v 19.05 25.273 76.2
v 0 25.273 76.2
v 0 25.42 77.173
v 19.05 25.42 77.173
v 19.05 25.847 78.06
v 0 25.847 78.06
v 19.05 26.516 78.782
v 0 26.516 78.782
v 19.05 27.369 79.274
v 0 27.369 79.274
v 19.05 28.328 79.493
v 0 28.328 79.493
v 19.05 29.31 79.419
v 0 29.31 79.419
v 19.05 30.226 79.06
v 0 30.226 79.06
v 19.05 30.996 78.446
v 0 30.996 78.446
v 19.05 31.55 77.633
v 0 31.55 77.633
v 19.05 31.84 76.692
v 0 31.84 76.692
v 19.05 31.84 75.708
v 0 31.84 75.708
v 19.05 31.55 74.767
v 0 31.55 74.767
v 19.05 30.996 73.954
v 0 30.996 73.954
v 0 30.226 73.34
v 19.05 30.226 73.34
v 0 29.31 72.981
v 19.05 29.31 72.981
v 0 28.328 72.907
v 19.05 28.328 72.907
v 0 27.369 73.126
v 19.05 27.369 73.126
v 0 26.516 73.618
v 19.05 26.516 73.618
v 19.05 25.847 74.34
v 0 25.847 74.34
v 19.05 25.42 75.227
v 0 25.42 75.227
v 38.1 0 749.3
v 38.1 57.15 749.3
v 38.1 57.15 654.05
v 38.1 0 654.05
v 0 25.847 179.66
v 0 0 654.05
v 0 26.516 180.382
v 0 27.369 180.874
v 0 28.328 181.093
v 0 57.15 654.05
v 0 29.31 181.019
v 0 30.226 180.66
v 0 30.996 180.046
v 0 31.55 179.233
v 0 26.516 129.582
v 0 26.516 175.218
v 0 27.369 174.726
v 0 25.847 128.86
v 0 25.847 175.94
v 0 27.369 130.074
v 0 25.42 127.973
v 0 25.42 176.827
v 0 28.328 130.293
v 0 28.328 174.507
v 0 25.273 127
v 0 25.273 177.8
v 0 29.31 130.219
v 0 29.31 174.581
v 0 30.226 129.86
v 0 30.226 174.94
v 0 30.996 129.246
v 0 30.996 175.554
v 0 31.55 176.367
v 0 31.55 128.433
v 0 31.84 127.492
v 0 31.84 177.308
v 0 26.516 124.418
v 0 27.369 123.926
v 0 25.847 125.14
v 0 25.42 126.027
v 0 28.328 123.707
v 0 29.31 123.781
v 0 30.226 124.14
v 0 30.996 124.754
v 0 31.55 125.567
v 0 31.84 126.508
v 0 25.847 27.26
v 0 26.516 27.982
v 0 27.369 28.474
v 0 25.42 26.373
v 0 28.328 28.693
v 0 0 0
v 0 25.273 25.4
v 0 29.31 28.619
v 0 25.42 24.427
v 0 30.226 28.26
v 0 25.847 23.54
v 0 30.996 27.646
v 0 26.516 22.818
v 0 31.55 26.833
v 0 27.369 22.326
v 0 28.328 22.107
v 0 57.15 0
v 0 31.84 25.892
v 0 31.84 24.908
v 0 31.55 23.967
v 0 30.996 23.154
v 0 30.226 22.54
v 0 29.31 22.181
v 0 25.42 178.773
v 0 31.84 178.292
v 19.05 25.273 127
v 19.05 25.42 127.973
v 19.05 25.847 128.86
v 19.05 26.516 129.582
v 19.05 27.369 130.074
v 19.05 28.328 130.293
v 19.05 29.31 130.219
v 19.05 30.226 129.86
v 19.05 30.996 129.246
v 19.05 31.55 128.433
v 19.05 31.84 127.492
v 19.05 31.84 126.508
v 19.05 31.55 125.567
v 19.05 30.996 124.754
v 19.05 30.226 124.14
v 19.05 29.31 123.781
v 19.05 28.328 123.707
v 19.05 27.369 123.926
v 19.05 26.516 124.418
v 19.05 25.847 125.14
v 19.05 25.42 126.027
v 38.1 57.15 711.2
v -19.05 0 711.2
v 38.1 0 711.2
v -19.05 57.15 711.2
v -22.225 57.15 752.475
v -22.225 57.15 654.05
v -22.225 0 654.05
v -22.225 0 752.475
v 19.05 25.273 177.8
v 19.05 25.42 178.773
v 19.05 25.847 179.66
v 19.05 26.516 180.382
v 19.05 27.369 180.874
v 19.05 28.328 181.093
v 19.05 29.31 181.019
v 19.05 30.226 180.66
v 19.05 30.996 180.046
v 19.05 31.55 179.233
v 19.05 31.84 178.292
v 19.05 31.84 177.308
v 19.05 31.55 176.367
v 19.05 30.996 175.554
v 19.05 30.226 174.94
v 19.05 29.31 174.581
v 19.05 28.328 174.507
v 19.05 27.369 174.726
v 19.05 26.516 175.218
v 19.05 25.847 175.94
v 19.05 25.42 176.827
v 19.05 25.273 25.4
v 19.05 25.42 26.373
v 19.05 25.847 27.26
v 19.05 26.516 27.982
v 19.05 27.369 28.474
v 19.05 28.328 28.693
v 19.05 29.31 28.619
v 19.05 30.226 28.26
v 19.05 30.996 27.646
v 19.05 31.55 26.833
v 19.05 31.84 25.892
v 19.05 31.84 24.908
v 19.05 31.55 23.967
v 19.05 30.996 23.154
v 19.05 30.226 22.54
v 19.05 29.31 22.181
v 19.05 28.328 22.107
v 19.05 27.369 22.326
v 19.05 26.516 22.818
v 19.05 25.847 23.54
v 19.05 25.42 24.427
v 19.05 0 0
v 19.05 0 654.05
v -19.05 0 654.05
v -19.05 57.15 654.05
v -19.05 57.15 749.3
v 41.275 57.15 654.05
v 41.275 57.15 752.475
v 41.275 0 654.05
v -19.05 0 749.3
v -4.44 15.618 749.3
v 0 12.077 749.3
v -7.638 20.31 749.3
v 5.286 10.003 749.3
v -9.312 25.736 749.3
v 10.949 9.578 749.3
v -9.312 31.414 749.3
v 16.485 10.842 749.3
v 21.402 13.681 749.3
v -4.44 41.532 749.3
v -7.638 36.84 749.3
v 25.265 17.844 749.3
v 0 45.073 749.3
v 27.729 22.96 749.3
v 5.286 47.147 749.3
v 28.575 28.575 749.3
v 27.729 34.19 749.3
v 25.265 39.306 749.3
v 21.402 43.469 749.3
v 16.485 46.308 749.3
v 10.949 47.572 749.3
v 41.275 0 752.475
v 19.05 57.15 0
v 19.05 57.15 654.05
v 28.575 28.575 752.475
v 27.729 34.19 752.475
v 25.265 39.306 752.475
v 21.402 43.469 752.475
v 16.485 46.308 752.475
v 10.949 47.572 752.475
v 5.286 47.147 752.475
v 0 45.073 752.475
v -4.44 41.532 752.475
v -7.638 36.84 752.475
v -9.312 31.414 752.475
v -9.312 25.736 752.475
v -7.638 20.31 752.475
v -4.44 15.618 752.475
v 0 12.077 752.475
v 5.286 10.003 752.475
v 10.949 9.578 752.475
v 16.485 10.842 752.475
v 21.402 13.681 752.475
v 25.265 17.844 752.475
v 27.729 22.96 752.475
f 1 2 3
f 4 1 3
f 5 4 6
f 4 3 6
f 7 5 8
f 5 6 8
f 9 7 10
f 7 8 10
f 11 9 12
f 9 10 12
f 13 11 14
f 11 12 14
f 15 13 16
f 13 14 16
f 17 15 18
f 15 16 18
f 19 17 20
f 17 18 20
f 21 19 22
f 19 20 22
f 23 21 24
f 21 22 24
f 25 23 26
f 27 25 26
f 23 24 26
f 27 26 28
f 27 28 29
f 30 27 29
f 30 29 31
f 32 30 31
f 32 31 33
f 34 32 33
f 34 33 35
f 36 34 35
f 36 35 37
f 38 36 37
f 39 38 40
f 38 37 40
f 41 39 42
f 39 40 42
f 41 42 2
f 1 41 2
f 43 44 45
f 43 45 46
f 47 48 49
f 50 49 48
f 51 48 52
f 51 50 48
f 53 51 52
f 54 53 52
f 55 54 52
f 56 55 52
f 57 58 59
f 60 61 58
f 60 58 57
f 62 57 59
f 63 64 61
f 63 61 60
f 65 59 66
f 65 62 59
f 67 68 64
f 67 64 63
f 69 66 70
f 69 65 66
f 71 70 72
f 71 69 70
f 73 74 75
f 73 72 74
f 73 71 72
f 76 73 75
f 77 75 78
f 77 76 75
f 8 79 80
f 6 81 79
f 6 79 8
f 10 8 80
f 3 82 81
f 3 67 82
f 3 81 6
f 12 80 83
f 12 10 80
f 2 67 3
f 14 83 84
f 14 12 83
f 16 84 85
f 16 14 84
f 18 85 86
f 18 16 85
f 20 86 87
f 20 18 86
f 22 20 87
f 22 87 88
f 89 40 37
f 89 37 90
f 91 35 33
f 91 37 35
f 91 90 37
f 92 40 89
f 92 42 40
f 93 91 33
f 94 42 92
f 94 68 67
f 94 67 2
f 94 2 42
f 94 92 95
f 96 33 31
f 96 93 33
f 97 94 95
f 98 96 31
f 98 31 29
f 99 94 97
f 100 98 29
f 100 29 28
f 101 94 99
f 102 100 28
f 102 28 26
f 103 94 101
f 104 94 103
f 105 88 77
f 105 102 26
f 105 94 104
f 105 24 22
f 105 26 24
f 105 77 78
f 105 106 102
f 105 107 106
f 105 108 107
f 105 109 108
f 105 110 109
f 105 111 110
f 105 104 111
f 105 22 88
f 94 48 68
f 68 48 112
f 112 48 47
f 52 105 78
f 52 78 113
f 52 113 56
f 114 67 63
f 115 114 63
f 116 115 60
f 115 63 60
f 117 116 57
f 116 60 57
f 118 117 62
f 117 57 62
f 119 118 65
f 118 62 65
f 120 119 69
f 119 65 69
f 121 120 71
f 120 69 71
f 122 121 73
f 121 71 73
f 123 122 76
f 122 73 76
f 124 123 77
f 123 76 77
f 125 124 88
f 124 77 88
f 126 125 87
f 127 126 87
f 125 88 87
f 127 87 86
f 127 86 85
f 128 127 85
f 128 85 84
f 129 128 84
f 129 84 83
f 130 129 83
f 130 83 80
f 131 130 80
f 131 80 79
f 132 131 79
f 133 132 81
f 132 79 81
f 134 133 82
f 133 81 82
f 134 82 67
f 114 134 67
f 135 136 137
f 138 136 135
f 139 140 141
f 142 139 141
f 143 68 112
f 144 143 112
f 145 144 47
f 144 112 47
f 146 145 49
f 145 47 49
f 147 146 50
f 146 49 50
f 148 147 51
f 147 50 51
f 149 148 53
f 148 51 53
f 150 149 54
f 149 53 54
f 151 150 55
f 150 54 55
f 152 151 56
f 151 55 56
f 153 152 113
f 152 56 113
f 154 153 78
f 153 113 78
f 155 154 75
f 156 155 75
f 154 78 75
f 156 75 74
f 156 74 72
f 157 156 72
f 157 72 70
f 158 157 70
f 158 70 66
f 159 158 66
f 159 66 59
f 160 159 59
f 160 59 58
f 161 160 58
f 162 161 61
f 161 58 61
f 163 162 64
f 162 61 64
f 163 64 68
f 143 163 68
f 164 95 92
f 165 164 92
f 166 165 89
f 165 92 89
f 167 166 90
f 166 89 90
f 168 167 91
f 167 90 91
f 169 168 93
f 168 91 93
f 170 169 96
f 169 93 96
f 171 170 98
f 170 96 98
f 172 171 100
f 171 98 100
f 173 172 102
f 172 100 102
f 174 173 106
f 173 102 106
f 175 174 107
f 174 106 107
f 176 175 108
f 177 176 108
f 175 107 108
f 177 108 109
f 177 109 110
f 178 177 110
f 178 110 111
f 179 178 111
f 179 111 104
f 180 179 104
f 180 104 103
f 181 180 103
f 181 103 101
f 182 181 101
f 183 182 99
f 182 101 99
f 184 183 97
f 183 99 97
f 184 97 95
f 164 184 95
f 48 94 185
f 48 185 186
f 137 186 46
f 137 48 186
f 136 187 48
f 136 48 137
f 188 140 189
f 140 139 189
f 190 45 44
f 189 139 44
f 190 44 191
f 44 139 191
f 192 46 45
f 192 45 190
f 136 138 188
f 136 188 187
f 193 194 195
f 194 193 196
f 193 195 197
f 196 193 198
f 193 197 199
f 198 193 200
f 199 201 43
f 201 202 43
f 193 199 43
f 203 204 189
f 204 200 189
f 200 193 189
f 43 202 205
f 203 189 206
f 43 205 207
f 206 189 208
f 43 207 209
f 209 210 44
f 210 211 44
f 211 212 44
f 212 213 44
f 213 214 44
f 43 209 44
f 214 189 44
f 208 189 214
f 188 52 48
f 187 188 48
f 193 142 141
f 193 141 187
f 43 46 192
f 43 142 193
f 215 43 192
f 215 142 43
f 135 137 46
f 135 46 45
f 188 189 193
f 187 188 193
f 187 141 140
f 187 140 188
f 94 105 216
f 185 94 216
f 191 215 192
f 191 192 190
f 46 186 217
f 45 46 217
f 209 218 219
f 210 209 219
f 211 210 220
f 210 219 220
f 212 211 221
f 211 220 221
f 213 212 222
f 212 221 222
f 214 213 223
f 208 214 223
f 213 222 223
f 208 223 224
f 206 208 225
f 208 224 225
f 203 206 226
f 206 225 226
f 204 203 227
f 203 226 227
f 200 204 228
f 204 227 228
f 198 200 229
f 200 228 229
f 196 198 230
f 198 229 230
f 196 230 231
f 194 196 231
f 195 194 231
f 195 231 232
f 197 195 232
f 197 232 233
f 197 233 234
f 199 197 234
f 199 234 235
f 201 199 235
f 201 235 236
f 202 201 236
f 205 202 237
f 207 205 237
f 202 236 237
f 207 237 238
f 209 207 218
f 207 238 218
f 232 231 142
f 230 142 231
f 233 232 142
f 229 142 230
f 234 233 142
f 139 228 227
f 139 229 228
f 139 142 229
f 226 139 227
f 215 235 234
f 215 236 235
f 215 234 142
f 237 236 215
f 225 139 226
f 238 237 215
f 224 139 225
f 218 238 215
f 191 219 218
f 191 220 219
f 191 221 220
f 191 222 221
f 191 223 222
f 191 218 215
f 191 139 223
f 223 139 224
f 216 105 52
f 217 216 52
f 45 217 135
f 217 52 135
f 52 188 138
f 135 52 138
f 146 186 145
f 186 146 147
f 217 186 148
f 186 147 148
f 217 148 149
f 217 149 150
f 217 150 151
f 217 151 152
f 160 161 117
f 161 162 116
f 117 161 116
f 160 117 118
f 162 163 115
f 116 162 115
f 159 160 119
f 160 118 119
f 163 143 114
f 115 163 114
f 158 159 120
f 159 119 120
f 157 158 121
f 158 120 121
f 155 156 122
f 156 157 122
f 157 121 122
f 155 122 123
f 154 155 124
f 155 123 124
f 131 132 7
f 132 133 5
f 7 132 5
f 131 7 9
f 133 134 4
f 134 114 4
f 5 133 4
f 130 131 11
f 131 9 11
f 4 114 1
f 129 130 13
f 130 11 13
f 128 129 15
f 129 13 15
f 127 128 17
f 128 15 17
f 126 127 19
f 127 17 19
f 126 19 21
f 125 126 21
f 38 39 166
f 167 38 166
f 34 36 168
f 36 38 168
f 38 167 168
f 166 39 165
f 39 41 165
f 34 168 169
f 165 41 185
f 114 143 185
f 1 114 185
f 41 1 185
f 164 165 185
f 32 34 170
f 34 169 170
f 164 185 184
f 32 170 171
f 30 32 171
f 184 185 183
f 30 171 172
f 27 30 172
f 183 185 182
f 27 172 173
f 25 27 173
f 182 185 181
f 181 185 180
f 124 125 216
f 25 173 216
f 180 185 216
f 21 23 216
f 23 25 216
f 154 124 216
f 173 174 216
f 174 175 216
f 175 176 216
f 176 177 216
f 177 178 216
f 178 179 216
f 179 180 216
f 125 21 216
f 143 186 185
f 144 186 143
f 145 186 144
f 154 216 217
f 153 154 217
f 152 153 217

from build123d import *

# Parameters (mm, degrees)
F0_W      = 19.05
F0_H      = 57.15
F1_DEPTH  = 711.2
F2_W      = 57.15
F2_H      = 57.15
F3_DEPTH  = 19.05
F4_W      = 57.15
F4_H      = 57.15
F5_DEPTH  = 19.05
F7_W      = 57.15
F7_H      = 57.15
F7_W_2    = 3.175
F8_DEPTH  = 3.175
F9_W      = 3.175
F9_H      = 57.15
F10_DEPTH = 95.25
F11_R     = 19.05
F12_DEPTH = 3.175
F13_R     = 3.302
F14_DEPTH = 19.05


with BuildPart() as f1:
    # F0 (on Top) → F1 (new body)
    with BuildSketch(Plane.XY):
        with Locations((9.525, 28.575)):
            Rectangle(F0_W, F0_H)
    extrude(amount=F1_DEPTH)

    # F2 (on face) → F3 (join)
    with BuildSketch(Plane(origin=(0, 0, 0), x_dir=(0, -1, 0), z_dir=(-1, 0, 0))):
        with Locations((-28.575, 682.625)):
            Rectangle(F2_W, F2_H)
    extrude(amount=F3_DEPTH)

    # F4 (on face) → F5 (join)
    with BuildSketch(Plane.YZ.offset(19.05)):
        with Locations((28.575, 682.625)):
            Rectangle(F4_W, F4_H)
    extrude(amount=F5_DEPTH)

    # F13 (on face) → F14 (cut, through all)
    with BuildSketch(Plane(origin=(0, 0, 0), x_dir=(0, -1, 0), z_dir=(-1, 0, 0))):
        with Locations((-28.575, 25.4)):
            Circle(F13_R)
        with Locations((-28.575, 76.2)):
            Circle(F13_R)
        with Locations((-28.575, 127)):
            Circle(F13_R)
        with Locations((-28.575, 177.8)):
            Circle(F13_R)
    extrude(amount=-F14_DEPTH, mode=Mode.SUBTRACT)


with BuildPart() as f8:
    # F7 (on offset) → F8 (new body)
    with BuildSketch(Plane.XY.offset(749.3)):
        with Locations((9.525, 28.575)):
            Rectangle(F7_W, F7_H)
        with Locations((39.6875, 28.575)):
            Rectangle(F7_W_2, F7_H)
        with Locations((-20.6375, 28.575)):
            Rectangle(F7_W_2, F7_H)
    extrude(amount=F8_DEPTH)

    # F9 (on face) → F10 (join, through all)
    with BuildSketch(Plane(origin=(0, 0, 749.3), x_dir=(1, 0, 0), z_dir=(0, 0, -1))):
        with Locations((-20.6375, -28.575)):
            Rectangle(F9_W, F9_H)
        with Locations((39.6875, -28.575)):
            Rectangle(F9_W, F9_H)
    extrude(amount=F10_DEPTH)

    # F11 (on face) → F12 (cut, through all)
    with BuildSketch(Plane.XY.offset(752.475)):
        with Locations((9.525, 28.575)):
            Circle(F11_R)
    extrude(amount=-F12_DEPTH, mode=Mode.SUBTRACT)


solid = Compound([f1.part, f8.part])
